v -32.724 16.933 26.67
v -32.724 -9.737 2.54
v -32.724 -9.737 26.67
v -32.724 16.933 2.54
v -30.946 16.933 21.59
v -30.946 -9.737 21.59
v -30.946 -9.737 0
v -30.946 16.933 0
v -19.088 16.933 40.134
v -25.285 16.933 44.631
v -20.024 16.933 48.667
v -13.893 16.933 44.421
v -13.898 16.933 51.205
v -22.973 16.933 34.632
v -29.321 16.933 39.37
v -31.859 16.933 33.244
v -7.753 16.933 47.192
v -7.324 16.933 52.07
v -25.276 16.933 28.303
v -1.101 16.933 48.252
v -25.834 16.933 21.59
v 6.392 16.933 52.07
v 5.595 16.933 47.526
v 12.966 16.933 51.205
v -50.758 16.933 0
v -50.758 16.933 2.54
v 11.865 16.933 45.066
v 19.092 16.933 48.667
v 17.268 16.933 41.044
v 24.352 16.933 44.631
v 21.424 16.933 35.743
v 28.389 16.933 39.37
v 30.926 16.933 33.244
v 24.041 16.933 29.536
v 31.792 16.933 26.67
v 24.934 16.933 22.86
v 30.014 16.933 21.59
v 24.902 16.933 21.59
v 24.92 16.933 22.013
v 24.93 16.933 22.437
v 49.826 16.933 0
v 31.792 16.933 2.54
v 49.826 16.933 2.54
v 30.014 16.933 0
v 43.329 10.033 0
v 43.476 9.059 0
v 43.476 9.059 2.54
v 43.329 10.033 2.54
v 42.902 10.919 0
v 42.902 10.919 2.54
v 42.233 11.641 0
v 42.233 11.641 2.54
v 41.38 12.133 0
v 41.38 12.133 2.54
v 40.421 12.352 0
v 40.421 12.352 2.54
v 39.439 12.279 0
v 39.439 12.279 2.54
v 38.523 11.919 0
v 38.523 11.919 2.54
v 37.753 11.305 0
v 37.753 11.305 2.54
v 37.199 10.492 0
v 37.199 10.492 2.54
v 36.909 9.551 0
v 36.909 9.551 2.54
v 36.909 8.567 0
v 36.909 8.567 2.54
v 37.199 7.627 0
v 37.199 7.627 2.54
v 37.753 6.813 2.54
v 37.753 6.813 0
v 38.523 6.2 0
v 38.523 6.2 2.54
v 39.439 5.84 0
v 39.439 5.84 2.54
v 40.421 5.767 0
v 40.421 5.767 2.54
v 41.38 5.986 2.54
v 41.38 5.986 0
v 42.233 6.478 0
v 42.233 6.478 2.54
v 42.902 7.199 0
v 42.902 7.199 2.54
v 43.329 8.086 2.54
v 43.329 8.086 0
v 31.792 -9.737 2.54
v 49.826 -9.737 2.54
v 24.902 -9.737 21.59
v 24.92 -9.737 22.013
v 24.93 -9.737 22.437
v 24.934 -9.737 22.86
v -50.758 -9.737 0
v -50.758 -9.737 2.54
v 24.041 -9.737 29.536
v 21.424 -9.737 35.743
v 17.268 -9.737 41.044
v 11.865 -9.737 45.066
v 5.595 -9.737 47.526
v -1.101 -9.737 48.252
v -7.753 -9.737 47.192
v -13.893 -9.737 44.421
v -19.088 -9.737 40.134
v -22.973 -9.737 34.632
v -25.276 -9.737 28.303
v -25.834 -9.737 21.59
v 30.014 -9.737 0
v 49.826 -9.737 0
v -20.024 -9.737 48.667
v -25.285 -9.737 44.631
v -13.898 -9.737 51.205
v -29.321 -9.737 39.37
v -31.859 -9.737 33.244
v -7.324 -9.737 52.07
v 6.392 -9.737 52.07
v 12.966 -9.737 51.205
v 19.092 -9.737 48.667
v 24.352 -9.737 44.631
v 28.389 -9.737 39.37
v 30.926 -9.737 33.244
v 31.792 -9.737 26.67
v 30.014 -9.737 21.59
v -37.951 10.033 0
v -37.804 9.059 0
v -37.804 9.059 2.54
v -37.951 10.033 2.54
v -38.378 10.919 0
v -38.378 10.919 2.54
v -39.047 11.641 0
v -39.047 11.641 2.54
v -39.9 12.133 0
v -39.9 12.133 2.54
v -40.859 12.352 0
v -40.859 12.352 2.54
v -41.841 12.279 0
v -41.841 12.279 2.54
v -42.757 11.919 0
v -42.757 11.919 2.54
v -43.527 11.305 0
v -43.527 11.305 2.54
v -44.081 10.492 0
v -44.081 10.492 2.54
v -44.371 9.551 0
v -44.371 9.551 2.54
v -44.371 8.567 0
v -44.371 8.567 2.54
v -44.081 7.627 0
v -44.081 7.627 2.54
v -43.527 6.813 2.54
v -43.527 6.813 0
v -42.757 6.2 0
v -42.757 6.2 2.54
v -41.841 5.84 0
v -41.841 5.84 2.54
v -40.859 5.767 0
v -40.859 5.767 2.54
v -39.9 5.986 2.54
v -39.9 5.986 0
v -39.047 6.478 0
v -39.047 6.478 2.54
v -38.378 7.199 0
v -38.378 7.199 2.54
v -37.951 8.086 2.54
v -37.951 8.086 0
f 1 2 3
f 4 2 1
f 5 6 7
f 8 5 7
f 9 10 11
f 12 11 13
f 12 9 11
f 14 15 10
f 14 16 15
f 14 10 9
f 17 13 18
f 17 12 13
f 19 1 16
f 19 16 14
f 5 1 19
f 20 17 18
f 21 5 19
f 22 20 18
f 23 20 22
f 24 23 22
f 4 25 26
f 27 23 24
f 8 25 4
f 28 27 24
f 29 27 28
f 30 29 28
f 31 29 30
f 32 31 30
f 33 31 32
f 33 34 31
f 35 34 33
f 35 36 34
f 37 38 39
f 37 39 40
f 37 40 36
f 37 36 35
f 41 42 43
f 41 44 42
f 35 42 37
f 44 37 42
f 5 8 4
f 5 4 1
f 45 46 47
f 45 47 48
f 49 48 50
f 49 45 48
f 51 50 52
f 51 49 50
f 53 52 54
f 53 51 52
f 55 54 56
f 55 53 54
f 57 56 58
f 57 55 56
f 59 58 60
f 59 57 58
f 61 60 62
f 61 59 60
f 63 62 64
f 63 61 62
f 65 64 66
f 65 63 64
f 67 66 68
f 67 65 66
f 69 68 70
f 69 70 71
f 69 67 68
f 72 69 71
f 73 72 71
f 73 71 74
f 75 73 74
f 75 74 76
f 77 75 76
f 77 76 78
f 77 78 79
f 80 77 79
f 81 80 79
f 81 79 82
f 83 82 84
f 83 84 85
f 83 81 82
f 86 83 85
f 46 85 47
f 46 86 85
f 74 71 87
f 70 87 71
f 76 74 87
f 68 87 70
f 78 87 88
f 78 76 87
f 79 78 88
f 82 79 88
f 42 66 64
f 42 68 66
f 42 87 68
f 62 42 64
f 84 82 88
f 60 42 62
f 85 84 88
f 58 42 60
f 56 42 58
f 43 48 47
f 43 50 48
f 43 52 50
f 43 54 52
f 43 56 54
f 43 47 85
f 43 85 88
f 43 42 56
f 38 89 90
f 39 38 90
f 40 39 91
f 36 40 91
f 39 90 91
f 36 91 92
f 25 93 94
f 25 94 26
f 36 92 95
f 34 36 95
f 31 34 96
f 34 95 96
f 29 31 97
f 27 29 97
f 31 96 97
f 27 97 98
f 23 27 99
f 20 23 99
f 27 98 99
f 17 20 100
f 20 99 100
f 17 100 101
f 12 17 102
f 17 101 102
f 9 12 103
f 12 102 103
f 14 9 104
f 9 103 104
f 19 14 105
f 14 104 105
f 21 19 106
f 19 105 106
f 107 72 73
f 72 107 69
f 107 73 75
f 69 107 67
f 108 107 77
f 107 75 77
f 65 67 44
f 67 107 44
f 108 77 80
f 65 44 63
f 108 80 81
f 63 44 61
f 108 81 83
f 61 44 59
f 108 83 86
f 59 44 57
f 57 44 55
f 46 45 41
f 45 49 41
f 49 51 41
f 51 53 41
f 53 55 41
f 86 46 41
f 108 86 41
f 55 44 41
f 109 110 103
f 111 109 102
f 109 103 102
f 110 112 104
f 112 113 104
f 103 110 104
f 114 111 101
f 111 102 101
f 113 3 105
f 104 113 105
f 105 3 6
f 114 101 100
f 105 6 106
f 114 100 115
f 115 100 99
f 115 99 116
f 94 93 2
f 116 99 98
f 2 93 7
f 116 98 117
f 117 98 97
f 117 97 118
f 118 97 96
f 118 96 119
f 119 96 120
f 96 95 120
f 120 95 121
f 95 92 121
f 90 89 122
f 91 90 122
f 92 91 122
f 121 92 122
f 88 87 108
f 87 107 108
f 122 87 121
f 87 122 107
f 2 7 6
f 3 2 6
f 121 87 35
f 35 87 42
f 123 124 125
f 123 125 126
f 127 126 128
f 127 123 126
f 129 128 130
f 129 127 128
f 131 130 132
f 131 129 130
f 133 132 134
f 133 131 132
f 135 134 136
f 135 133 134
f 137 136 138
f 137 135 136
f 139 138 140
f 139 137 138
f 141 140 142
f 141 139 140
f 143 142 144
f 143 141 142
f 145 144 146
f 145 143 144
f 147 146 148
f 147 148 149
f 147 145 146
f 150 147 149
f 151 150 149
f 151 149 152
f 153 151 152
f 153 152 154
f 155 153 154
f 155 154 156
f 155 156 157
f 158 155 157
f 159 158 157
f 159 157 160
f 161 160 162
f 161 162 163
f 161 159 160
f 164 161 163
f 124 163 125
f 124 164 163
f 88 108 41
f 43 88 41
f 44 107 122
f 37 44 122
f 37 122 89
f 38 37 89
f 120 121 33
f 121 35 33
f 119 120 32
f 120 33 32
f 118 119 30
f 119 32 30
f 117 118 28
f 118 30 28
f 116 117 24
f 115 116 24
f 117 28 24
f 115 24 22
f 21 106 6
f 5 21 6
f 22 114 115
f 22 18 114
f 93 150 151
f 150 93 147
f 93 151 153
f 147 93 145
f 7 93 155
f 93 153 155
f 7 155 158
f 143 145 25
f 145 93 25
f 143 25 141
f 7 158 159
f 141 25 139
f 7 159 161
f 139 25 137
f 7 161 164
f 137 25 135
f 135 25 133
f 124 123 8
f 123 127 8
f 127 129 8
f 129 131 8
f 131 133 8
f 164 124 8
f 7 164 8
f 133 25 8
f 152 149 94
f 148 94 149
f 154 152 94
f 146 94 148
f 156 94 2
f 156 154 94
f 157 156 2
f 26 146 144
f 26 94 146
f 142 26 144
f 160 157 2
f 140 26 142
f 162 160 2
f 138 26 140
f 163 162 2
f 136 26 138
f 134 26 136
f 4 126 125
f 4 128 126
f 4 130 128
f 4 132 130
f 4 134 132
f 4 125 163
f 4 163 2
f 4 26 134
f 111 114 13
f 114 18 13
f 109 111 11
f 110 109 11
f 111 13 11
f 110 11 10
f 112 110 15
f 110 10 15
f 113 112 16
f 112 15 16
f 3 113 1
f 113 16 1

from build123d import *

# Parameters (mm, degrees)
SKETCH1_W           = 100.584
SKETCH1_H           = 26.67
SKETCH1_R           = 3.302
BOSS_EXTRUDE1_DEPTH = 2.54
SKETCH2_W           = 64.516
SKETCH2_H           = 26.67
BOSS_EXTRUDE2_DEPTH = 49.53
CUT_EXTRUDE1_REACH  = 28.67
FILLET1_R           = 25.4


with BuildPart() as part:
    # Sketch1 → Boss-Extrude1 (new body)
    with BuildSketch(Plane.XY):
        with Locations((-0.466217893, 3.598360719)):
            Rectangle(SKETCH1_W, SKETCH1_H)
        with Locations((-41.106217893, 9.059360719)):
            Circle(SKETCH1_R, mode=Mode.SUBTRACT)
        with Locations((40.173782107, 9.059360719)):
            Circle(SKETCH1_R, mode=Mode.SUBTRACT)
    extrude(amount=BOSS_EXTRUDE1_DEPTH)

    # Sketch2 → Boss-Extrude2 (add)
    with BuildSketch(Plane.XY.offset(2.54)):
        with Locations((-0.466217893, 3.598360719)):
            Rectangle(SKETCH2_W, SKETCH2_H)
    extrude(amount=BOSS_EXTRUDE2_DEPTH)

    # Sketch5 → Cut-Extrude1 (cut, up to next)
    with BuildSketch(Plane.XZ.offset(9.736639281), mode=Mode.PRIVATE) as cut_extrude1_sk1:
        with BuildLine():
            ThreePointArc((24.933782107, 22.86), (-1.101416548, 48.252056291), (-25.834448025, 21.59))
            Line((-25.834448025, 21.59), (24.902012238, 21.59))
            ThreePointArc((24.902012238, 21.59), (24.925838398, 22.224801345), (24.933782107, 22.86))
        make_face()
    cut_extrude1_tool1 = extrude(cut_extrude1_sk1.sketch, amount=-CUT_EXTRUDE1_REACH, mode=Mode.PRIVATE) & part.part
    add(cut_extrude1_tool1.solids().sort_by_distance((-0.466218, -9.736639, 32.957158))[0], mode=Mode.SUBTRACT)
    # Sketch5 → Cut-Extrude1 (cut, up to next)
    with BuildSketch(Plane.XZ.offset(9.736639281), mode=Mode.PRIVATE) as cut_extrude1_sk2:
        with BuildLine():
            ThreePointArc((-25.834448025, 21.59), (-21.643974867, 8.836355339), (-11.53782121, 0))
            Line((-11.53782121, 0), (10.605385423, 0))
            ThreePointArc((10.605385423, 0), (20.71153908, 8.836355339), (24.902012238, 21.59))
            Line((24.902012238, 21.59), (-25.834448025, 21.59))
        make_face()
    cut_extrude1_tool2 = extrude(cut_extrude1_sk2.sketch, amount=-CUT_EXTRUDE1_REACH, mode=Mode.PRIVATE) & part.part
    add(cut_extrude1_tool2.solids().sort_by_distance((-0.466218, -9.736639, 11.906571))[0], mode=Mode.SUBTRACT)
    # Sketch5 → Cut-Extrude1 (cut, up to next)
    with BuildSketch(Plane.XZ.offset(9.736639281), mode=Mode.PRIVATE) as cut_extrude1_sk3:
        with BuildLine():
            Line((-30.946217893, 21.59), (-30.946217893, 0))
            Line((-30.946217893, 0), (-11.53782121, 0))
            ThreePointArc((-11.53782121, 0), (-21.643974867, 8.836355339), (-25.834448025, 21.59))
            Line((-25.834448025, 21.59), (-30.946217893, 21.59))
        make_face()
    cut_extrude1_tool3 = extrude(cut_extrude1_sk3.sketch, amount=-CUT_EXTRUDE1_REACH, mode=Mode.PRIVATE) & part.part
    add(cut_extrude1_tool3.solids().sort_by_distance((-25.424083, -9.736639, 8.295091))[0], mode=Mode.SUBTRACT)
    # Sketch5 → Cut-Extrude1 (cut, up to next)
    with BuildSketch(Plane.XZ.offset(9.736639281), mode=Mode.PRIVATE) as cut_extrude1_sk4:
        with BuildLine():
            ThreePointArc((24.902012238, 21.59), (20.71153908, 8.836355339), (10.605385423, 0))
            Line((10.605385423, 0), (30.013782107, 0))
            Line((30.013782107, 0), (30.013782107, 21.59))
            Line((30.013782107, 21.59), (24.902012238, 21.59))
        make_face()
    cut_extrude1_tool4 = extrude(cut_extrude1_sk4.sketch, amount=-CUT_EXTRUDE1_REACH, mode=Mode.PRIVATE) & part.part
    add(cut_extrude1_tool4.solids().sort_by_distance((24.491648, -9.736639, 8.295091))[0], mode=Mode.SUBTRACT)

    # Fillet1
    fillet1_edges = [part.edges().sort_by_distance(p)[0] for p in [
        (-32.724217893, 3.598360719, 52.07),
        (31.791782107, 3.598360719, 52.07),
    ]]
    fillet(fillet1_edges, radius=FILLET1_R)


solid = part.part
